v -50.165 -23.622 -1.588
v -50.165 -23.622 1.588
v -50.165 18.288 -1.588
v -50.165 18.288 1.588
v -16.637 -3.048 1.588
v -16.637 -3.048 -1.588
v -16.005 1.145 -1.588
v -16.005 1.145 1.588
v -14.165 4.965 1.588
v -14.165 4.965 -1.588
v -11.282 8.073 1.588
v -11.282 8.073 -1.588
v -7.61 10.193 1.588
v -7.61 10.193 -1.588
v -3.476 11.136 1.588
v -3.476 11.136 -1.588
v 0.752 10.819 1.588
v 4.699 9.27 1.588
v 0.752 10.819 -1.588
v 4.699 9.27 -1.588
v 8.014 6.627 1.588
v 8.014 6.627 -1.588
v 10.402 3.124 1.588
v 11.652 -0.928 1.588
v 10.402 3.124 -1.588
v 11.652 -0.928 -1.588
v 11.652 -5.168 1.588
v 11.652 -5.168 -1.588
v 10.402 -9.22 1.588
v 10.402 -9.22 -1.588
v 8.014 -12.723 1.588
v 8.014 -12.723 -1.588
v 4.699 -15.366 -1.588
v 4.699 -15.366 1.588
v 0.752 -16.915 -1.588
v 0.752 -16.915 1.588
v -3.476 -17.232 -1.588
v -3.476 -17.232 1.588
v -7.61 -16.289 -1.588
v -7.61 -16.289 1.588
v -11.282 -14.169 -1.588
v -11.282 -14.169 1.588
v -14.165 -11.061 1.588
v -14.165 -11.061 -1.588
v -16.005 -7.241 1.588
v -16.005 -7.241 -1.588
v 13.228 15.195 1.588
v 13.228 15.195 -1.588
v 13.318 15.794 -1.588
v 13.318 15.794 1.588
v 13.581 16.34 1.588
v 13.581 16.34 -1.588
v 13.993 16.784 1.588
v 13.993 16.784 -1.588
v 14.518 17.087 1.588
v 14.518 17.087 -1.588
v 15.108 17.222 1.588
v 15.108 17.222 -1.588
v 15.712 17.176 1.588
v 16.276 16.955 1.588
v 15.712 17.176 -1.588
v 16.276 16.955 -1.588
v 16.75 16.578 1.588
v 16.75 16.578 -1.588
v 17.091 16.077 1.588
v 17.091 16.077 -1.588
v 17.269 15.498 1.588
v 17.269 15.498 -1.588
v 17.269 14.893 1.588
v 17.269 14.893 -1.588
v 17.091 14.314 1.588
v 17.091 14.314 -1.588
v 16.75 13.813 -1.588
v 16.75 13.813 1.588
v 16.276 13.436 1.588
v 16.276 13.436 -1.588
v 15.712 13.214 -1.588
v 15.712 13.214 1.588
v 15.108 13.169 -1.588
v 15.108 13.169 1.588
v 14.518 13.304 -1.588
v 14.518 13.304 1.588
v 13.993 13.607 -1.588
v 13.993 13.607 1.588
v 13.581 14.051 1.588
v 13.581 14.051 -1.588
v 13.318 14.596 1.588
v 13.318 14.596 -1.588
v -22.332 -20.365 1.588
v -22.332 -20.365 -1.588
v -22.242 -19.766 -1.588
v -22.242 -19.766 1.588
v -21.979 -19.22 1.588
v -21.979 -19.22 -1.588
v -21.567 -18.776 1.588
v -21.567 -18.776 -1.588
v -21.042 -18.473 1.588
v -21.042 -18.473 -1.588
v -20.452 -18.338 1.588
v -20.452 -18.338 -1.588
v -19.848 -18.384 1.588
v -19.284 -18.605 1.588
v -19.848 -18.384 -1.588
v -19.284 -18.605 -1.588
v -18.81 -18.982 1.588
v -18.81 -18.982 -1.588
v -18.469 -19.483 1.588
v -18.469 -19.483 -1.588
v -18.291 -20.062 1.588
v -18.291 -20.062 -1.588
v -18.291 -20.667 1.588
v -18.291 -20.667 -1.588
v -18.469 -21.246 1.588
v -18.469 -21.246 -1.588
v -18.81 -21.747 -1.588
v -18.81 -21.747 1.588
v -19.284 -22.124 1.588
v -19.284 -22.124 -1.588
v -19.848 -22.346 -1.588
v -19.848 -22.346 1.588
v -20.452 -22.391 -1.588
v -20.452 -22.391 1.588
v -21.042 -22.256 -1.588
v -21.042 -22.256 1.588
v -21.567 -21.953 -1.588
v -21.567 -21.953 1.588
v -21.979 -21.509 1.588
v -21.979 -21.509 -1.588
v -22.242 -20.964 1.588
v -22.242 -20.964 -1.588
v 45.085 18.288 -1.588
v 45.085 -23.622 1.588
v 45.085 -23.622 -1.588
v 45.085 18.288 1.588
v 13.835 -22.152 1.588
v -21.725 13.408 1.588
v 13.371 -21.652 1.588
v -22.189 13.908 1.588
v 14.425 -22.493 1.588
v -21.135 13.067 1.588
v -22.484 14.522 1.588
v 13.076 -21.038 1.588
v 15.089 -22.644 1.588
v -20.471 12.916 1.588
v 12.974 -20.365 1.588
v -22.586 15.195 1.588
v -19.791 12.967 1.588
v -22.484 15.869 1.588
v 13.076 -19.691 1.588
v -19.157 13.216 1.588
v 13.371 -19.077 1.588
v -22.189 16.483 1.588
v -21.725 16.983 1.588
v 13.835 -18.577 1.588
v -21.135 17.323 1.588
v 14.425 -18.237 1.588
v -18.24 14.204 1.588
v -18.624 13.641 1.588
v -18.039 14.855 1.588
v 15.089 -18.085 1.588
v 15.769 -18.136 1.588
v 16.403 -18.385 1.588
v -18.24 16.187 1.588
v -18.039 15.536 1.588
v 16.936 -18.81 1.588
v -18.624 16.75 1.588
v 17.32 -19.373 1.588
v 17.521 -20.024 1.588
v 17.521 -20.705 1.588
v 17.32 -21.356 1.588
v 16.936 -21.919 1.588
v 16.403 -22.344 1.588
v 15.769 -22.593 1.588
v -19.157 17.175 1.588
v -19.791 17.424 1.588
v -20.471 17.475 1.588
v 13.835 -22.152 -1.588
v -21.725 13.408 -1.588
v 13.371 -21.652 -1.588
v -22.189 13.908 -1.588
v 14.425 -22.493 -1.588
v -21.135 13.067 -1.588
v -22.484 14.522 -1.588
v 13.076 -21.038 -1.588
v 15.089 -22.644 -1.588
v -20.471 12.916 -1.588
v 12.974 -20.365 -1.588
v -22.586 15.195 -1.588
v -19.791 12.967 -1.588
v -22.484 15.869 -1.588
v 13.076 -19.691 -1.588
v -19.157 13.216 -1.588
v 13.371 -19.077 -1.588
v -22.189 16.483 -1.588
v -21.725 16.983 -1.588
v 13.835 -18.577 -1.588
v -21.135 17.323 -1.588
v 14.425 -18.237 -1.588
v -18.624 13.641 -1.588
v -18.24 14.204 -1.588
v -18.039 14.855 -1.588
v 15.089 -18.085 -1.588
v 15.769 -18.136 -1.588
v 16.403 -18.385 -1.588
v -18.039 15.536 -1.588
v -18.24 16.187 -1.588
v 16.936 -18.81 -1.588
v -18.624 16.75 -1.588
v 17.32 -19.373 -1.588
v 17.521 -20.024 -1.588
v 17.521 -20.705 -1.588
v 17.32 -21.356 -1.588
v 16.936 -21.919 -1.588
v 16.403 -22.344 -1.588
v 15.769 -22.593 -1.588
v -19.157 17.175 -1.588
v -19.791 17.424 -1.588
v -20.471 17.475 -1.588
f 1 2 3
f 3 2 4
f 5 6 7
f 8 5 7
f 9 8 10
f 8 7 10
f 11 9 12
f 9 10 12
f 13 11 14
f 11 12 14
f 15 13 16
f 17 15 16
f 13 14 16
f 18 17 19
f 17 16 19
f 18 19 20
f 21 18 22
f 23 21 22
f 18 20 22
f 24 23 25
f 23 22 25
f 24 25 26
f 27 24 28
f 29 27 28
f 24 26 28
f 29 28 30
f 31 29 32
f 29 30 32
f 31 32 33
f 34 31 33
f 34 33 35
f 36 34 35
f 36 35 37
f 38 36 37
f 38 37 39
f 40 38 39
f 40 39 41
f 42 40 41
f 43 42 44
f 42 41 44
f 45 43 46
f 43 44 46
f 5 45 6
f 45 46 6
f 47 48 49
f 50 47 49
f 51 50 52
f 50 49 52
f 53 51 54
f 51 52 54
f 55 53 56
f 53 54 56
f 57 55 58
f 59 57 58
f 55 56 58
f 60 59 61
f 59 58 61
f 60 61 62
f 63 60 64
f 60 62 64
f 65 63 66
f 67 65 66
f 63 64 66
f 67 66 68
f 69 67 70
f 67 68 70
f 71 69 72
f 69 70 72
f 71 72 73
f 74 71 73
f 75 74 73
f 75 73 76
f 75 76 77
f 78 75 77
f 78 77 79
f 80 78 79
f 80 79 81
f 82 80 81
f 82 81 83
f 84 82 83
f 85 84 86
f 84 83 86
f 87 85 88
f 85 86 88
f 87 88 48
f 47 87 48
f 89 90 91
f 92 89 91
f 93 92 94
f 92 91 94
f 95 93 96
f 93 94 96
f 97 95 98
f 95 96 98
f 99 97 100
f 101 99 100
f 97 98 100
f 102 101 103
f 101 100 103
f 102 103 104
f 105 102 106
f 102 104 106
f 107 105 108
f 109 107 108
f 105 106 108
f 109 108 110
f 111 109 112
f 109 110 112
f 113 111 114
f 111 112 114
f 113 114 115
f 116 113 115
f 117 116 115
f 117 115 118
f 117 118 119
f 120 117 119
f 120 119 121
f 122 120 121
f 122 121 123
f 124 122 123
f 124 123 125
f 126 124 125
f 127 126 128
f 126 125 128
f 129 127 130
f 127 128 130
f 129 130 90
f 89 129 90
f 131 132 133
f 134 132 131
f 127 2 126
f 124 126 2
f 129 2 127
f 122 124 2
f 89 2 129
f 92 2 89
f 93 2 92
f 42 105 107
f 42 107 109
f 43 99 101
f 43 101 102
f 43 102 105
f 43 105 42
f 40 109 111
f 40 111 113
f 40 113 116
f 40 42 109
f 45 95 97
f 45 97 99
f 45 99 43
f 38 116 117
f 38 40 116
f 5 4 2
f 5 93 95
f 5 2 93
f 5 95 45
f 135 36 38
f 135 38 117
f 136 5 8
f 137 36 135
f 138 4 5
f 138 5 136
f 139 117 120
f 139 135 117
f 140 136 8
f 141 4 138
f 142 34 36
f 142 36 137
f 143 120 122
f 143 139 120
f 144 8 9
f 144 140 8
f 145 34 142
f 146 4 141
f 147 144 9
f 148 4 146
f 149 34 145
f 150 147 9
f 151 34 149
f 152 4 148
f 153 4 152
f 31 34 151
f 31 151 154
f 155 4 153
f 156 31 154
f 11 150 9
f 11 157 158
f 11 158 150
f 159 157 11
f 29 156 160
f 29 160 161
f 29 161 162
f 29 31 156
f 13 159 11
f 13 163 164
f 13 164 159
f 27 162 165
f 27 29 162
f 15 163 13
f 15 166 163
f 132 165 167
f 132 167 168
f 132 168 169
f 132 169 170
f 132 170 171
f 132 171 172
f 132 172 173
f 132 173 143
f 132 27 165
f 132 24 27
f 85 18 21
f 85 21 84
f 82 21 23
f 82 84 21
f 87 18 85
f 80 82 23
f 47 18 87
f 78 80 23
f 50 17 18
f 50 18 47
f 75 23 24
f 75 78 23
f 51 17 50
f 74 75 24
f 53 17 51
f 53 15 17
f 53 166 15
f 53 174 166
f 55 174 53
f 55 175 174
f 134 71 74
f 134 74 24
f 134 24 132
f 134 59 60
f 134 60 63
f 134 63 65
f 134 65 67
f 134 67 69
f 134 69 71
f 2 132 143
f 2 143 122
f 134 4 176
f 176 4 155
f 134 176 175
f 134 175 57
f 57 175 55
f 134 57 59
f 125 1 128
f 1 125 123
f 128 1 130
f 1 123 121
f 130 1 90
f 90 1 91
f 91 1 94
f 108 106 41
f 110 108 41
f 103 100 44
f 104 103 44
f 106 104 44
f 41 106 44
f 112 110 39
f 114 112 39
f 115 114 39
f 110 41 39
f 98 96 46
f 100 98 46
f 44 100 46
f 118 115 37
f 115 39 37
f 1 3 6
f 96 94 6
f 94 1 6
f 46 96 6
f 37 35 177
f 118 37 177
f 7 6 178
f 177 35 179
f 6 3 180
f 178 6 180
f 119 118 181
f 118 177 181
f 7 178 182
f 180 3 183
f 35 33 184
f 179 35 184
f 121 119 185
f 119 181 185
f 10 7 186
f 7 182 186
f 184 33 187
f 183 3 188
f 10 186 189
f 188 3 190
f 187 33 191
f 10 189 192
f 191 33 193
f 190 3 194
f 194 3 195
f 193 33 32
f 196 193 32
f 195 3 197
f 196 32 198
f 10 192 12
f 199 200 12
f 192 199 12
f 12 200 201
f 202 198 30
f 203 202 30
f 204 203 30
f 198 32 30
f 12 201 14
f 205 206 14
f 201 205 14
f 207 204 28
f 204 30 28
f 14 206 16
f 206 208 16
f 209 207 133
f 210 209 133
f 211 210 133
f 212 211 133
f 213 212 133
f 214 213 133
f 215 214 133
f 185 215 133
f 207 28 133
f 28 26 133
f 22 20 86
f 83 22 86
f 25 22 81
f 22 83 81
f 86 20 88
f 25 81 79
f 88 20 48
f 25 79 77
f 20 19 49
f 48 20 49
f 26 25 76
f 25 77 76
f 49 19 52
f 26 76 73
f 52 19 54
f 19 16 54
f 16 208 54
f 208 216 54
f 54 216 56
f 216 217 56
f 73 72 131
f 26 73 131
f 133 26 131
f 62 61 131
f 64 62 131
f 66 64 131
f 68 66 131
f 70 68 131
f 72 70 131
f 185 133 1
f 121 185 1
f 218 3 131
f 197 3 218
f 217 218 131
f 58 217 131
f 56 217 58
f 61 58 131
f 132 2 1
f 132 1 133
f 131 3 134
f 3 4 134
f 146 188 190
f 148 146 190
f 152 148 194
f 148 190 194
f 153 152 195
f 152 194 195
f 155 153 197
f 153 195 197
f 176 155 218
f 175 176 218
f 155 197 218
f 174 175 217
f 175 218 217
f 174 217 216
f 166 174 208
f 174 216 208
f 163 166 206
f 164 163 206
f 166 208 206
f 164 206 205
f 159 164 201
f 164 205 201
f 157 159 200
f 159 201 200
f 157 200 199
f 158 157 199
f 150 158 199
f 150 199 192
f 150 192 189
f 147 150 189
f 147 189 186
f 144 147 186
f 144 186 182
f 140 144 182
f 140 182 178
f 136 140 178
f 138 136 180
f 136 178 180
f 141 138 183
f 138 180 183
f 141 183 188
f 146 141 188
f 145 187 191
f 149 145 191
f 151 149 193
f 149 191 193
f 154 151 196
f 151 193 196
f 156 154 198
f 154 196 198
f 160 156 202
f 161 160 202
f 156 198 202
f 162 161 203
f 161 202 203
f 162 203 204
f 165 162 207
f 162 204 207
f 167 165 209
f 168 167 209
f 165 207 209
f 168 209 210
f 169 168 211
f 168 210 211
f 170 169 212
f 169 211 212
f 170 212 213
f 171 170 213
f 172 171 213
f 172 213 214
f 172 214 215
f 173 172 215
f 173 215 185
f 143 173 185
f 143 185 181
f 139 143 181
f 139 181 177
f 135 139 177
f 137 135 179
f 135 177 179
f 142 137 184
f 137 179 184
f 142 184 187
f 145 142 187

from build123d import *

# Parameters (mm, degrees)
SKETCH1_W           = 95.25
SKETCH1_H           = 41.91
BOSS_EXTRUDE1_DEPTH = 1.5875
SKETCH2_R           = 14.224
SKETCH2_R_2         = 2.286
SKETCH2_R_3         = 2.032
CUT_EXTRUDE1_DEPTH  = 3.175


with BuildPart() as part:
    # Sketch1 → Boss-Extrude1 (new, symmetric)
    with BuildSketch(Plane.XY):
        with Locations((-2.54, -2.667)):
            Rectangle(SKETCH1_W, SKETCH1_H)
    extrude(amount=BOSS_EXTRUDE1_DEPTH, both=True)

    # Sketch2 → Cut-Extrude1 (cut)
    with BuildSketch(Plane(origin=(0, 0, -1.5875), x_dir=(-1, 0, 0), z_dir=(0, 0, -1))):
        with Locations((2.413, -3.048)):
            Circle(SKETCH2_R)
        with Locations((-15.260103904, -20.364606719)):
            Circle(SKETCH2_R_2)
        with Locations((-15.260103904, 15.195393281)):
            Circle(SKETCH2_R_3)
        with Locations((20.299896096, 15.195393281)):
            Circle(SKETCH2_R_2)
        with Locations((20.299896096, -20.364606719)):
            Circle(SKETCH2_R_3)
    extrude(amount=-CUT_EXTRUDE1_DEPTH, mode=Mode.SUBTRACT)


solid = part.part
